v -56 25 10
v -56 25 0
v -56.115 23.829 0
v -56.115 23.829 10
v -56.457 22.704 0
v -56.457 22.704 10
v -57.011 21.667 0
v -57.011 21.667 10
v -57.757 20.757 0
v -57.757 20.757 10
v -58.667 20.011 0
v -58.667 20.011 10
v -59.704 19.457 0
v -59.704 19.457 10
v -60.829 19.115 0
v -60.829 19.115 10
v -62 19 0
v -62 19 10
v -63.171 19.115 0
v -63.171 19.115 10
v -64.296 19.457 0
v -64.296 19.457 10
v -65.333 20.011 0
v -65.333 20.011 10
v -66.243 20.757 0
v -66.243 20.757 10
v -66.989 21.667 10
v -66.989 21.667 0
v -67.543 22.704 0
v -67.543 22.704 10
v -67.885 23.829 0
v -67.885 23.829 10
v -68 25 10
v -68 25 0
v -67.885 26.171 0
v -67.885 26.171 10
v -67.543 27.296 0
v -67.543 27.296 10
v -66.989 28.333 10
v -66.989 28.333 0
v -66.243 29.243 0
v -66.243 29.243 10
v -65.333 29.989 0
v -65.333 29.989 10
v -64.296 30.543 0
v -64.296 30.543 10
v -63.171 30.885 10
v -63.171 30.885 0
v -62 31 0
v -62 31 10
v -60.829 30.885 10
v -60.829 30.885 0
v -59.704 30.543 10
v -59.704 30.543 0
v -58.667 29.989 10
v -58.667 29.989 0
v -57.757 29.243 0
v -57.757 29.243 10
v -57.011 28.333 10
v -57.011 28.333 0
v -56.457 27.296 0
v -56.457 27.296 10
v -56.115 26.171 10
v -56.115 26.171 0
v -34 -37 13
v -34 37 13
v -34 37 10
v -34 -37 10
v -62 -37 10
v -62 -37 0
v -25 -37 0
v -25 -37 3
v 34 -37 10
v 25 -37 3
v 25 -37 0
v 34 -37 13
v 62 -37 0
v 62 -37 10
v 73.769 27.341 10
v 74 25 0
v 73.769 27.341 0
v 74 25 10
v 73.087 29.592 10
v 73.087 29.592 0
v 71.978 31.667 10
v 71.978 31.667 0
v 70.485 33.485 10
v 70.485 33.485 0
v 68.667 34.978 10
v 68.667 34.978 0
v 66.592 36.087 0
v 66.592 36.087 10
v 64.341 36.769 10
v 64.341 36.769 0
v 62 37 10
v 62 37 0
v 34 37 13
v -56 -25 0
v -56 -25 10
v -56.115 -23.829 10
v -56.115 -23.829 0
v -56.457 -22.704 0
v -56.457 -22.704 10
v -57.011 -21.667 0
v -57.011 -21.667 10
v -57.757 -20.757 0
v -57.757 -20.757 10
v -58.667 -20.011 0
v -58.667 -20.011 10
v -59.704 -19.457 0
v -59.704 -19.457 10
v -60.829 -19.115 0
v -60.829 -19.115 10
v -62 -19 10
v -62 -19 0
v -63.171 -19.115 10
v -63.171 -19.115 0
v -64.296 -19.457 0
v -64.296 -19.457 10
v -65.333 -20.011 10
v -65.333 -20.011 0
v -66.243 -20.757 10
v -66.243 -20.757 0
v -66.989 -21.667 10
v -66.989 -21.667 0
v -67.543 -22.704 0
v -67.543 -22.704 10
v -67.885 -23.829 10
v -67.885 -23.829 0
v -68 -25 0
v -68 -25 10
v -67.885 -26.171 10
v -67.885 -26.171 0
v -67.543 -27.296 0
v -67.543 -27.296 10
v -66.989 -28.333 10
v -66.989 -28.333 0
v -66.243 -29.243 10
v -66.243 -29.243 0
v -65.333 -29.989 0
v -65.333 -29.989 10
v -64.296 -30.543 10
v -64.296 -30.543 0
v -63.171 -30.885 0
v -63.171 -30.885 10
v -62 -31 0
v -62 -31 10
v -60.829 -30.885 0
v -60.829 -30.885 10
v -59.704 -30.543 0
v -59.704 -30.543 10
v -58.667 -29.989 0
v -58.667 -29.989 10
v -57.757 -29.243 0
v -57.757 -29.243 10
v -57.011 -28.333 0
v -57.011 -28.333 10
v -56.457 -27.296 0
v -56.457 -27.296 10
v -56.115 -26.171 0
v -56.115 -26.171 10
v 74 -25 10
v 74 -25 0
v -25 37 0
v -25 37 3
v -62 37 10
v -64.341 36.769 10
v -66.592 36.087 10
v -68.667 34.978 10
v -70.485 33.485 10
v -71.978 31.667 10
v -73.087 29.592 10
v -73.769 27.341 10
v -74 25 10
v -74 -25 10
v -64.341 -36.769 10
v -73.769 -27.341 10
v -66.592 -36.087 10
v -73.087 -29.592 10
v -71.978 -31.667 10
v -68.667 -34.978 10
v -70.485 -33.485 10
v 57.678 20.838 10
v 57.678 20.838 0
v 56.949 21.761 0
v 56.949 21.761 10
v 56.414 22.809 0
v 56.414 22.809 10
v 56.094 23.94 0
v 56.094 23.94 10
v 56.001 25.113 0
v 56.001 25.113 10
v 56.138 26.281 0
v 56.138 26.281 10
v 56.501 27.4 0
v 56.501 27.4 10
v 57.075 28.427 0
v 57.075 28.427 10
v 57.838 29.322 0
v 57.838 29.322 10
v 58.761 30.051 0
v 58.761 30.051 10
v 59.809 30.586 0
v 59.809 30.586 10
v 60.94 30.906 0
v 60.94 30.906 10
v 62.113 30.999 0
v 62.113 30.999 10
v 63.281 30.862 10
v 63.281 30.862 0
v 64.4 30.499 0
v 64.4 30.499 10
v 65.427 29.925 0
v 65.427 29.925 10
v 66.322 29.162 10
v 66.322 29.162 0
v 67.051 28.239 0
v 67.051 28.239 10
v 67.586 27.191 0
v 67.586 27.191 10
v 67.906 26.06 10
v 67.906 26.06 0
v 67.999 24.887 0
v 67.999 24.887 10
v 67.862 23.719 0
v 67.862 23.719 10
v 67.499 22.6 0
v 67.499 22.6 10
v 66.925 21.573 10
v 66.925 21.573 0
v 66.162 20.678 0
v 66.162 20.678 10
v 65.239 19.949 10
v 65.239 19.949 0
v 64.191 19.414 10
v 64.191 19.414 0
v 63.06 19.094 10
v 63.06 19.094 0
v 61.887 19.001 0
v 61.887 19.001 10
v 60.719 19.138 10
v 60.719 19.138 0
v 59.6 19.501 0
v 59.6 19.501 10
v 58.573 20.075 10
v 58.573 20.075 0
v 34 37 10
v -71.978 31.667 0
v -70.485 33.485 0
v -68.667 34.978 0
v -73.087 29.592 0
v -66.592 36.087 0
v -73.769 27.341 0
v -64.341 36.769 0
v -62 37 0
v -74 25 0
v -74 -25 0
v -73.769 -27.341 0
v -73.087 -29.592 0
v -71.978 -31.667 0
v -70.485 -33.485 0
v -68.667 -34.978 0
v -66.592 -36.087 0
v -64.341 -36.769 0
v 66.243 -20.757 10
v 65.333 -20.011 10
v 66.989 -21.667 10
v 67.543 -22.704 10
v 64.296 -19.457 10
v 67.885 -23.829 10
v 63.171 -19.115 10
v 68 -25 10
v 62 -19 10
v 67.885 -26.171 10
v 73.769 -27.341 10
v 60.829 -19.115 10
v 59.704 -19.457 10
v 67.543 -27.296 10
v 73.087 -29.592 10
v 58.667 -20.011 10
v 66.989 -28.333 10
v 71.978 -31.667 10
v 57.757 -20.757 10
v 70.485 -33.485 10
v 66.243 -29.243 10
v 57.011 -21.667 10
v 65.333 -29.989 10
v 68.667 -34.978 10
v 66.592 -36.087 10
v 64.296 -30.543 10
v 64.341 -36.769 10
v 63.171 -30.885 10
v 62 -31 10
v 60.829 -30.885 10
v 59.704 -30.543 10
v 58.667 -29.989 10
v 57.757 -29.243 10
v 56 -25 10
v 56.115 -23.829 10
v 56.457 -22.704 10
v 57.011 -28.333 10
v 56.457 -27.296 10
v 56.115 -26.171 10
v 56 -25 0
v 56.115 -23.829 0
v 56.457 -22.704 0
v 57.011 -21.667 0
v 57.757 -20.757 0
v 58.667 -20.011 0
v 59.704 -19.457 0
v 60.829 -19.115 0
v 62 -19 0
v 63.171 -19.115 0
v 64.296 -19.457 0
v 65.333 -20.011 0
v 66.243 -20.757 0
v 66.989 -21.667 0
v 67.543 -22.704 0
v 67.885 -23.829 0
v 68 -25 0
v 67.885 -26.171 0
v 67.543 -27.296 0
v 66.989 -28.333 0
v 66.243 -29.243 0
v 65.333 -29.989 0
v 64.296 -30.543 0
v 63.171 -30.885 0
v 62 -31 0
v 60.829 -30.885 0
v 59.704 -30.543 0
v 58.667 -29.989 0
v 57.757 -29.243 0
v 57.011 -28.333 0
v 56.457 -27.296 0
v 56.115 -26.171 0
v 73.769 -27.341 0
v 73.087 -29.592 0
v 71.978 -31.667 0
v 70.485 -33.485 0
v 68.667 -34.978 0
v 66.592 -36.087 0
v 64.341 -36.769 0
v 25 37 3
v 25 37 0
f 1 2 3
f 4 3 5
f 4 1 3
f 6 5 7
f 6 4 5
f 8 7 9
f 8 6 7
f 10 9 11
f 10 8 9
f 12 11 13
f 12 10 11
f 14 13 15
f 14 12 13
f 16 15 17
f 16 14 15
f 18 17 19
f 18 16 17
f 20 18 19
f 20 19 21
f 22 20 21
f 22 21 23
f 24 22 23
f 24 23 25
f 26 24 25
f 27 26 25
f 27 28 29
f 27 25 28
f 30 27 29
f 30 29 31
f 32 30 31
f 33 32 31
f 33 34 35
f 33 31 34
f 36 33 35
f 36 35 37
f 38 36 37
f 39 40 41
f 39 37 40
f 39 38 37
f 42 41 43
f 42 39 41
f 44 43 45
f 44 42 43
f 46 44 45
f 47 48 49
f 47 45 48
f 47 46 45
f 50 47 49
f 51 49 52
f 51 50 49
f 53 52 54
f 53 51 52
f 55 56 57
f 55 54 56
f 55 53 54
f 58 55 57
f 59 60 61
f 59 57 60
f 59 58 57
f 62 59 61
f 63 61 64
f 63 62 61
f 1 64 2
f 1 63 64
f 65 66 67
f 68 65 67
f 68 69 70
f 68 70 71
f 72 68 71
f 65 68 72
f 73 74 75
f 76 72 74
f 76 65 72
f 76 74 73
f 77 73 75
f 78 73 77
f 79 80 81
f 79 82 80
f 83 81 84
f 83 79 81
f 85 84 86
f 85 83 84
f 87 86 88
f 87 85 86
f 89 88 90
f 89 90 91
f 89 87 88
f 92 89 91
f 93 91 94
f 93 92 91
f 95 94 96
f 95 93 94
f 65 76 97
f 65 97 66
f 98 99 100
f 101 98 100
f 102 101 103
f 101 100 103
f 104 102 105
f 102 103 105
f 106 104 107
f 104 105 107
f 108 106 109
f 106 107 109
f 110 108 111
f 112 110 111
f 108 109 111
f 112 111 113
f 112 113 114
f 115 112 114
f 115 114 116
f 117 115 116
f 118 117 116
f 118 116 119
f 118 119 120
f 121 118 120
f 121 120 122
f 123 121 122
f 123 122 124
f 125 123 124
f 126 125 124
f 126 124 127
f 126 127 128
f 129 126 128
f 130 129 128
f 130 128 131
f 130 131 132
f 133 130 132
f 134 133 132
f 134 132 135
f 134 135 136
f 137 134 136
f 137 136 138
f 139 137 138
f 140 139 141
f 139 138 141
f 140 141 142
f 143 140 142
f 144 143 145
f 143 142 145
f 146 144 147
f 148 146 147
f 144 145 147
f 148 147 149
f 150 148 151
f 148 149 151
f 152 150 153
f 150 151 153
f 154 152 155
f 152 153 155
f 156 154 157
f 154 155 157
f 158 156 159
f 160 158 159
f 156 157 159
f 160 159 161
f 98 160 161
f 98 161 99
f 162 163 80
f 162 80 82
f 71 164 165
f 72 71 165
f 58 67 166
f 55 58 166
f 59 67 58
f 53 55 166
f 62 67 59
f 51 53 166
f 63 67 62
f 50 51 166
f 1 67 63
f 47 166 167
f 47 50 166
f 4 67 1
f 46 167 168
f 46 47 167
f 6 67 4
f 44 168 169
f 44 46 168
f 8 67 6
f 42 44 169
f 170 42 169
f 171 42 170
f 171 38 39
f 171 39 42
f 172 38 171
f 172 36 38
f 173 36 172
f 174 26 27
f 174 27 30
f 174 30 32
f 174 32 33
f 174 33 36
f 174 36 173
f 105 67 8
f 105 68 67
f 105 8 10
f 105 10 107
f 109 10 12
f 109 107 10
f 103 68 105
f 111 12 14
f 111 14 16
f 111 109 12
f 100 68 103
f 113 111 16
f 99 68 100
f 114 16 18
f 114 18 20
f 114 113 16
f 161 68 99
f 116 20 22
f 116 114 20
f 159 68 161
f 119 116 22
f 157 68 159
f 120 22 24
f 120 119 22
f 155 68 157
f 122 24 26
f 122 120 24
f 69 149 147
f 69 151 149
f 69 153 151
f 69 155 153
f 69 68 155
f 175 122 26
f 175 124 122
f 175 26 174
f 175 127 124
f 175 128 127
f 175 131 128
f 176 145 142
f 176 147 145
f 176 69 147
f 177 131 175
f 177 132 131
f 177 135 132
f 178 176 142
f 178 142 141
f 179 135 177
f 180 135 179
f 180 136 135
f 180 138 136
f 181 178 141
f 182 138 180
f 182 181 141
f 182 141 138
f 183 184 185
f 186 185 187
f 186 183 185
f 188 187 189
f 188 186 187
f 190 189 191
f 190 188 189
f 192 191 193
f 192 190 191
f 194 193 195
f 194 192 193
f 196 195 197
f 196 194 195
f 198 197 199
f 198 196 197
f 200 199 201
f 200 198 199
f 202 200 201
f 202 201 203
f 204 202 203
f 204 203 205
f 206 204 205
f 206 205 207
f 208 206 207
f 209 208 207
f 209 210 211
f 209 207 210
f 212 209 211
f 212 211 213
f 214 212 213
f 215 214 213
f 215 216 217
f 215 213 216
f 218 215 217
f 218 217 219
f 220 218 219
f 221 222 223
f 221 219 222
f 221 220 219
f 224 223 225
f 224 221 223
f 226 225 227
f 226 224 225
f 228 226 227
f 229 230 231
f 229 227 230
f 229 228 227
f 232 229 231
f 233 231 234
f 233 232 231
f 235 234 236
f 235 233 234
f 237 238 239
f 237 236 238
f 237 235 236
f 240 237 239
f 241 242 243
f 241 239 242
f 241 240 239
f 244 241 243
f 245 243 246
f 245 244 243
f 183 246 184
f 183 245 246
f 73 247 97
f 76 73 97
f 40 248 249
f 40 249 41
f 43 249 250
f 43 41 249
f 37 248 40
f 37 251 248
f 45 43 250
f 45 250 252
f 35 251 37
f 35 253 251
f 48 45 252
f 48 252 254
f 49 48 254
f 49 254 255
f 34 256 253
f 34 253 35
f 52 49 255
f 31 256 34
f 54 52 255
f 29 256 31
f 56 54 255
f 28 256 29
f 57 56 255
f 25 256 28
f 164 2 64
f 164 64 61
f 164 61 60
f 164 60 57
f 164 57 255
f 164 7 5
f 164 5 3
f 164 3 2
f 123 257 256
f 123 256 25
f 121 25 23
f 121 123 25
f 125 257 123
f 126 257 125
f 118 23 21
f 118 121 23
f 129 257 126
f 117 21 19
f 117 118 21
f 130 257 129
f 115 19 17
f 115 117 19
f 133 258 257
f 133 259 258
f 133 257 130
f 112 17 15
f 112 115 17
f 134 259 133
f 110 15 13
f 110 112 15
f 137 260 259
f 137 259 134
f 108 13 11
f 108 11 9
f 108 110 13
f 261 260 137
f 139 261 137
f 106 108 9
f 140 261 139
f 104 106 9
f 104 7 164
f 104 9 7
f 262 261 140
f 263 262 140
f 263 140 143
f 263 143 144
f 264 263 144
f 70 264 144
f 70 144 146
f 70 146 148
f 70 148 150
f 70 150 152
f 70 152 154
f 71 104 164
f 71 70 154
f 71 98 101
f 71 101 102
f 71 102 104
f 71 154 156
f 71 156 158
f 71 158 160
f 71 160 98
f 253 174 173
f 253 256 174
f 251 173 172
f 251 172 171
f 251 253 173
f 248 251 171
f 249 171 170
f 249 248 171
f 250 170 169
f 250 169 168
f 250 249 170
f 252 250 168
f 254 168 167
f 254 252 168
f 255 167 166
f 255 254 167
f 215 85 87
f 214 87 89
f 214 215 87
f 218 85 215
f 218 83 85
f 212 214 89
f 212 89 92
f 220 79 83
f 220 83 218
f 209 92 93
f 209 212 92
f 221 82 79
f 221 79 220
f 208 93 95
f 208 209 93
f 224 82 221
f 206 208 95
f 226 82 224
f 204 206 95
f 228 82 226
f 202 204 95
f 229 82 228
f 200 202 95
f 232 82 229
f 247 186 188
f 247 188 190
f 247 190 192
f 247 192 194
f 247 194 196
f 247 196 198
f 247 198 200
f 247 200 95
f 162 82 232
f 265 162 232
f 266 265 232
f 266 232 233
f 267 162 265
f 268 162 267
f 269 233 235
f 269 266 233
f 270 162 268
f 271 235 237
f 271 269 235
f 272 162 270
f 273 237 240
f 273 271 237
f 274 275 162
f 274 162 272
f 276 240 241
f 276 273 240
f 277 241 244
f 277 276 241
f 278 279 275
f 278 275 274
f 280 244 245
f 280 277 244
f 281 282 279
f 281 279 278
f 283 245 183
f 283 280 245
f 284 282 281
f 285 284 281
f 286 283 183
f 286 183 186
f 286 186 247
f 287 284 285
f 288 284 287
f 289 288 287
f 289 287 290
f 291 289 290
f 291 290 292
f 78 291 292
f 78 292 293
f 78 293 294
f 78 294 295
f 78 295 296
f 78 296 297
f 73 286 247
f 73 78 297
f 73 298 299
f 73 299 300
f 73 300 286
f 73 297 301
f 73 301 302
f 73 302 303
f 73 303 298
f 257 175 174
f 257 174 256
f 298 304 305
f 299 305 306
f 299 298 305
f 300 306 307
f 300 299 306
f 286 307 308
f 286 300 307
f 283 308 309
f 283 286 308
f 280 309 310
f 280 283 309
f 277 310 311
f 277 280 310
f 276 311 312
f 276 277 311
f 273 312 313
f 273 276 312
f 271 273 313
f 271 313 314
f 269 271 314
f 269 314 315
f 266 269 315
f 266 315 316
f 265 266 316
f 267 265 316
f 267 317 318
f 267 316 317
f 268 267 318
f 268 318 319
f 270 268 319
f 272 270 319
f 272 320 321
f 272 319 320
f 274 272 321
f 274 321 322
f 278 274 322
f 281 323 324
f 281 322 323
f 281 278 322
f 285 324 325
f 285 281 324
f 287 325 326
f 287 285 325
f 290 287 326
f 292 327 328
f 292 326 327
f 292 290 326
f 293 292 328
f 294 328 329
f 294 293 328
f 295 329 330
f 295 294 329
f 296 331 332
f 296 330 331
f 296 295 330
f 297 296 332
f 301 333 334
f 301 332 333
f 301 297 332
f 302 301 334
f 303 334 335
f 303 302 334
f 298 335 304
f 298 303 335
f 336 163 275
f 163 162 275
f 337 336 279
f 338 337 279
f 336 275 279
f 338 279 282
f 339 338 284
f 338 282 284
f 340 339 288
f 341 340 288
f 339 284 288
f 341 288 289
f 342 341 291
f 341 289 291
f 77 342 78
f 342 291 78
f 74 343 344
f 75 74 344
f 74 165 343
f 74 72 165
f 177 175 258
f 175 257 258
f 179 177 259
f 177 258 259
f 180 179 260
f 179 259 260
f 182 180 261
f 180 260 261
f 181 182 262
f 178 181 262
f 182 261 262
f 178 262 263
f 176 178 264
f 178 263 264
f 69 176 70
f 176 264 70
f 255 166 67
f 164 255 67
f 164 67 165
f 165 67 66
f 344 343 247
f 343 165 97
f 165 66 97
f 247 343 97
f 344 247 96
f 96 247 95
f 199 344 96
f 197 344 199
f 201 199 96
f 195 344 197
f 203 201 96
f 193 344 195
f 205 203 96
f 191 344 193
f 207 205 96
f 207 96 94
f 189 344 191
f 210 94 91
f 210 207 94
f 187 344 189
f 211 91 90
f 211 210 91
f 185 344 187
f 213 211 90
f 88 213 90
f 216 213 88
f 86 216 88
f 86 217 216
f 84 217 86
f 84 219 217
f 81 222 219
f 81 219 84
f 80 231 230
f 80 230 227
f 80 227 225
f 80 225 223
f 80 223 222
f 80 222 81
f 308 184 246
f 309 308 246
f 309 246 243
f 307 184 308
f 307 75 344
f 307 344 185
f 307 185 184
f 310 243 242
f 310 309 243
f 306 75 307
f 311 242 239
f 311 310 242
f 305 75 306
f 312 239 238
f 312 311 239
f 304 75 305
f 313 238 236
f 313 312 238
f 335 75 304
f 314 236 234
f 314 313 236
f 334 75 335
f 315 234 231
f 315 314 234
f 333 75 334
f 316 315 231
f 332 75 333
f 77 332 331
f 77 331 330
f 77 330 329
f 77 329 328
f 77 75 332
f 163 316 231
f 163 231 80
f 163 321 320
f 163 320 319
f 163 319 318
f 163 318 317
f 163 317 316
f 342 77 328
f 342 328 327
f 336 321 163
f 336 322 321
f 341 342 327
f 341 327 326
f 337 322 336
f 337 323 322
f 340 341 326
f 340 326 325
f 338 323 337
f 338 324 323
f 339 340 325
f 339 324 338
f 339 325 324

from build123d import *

# Parameters (mm, degrees)
F1_DEPTH = 37
F2_R     = 12
F3_R     = 6
F4_DEPTH = 25


# Not quite as in the source:
# - a pattern or mirror of a feature is missing from the dataset's text; its kind, count and spacing are read off the source's solid


with BuildPart() as f1:
    # F0 (on Front) → F1 (new body, symmetric)
    with BuildSketch(Plane.XZ):
        Polygon((-25, 3), (0, 3), (25, 3), (25, 0), (74, 0), (74, 10), (34, 10), (34, 13), (0, 13), (-34, 13), (-34, 10), (-74, 10), (-74, 0), (-25, 0), align=None)
    extrude(amount=F1_DEPTH, both=True)

    # F2
    f2_edges = [f1.edges().sort_by_distance(p)[0] for p in [
        (74, -37, 5),
        (74, 37, 5),
        (-74, -37, 5),
        (-74, 37, 5),
    ]]
    fillet(f2_edges, radius=F2_R)

    # F3 (on face) → F4 (cut)
    with BuildSketch(Plane.XY.offset(10)):
        with Locations((-62, -25)):
            Circle(F3_R)
    f4 = extrude(amount=-F4_DEPTH, mode=Mode.SUBTRACT)

    # F4_copies: F4 across plane
    add(f4.mirror(Plane.ZX), mode=Mode.SUBTRACT)

    # F4_copies1: F4 across plane
    add(f4.mirror(Plane(origin=(0, 0, 0), x_dir=(-0.3739683355, 0.927441472, 0), z_dir=(0.927441472, 0.3739683355, 0))), mode=Mode.SUBTRACT)

    # F4_copies2: F4 across plane
    add(f4.mirror(Plane(origin=(0, 0, 0), x_dir=(0, 0, 1), z_dir=(1, 0, 0))), mode=Mode.SUBTRACT)


solid = f1.part
